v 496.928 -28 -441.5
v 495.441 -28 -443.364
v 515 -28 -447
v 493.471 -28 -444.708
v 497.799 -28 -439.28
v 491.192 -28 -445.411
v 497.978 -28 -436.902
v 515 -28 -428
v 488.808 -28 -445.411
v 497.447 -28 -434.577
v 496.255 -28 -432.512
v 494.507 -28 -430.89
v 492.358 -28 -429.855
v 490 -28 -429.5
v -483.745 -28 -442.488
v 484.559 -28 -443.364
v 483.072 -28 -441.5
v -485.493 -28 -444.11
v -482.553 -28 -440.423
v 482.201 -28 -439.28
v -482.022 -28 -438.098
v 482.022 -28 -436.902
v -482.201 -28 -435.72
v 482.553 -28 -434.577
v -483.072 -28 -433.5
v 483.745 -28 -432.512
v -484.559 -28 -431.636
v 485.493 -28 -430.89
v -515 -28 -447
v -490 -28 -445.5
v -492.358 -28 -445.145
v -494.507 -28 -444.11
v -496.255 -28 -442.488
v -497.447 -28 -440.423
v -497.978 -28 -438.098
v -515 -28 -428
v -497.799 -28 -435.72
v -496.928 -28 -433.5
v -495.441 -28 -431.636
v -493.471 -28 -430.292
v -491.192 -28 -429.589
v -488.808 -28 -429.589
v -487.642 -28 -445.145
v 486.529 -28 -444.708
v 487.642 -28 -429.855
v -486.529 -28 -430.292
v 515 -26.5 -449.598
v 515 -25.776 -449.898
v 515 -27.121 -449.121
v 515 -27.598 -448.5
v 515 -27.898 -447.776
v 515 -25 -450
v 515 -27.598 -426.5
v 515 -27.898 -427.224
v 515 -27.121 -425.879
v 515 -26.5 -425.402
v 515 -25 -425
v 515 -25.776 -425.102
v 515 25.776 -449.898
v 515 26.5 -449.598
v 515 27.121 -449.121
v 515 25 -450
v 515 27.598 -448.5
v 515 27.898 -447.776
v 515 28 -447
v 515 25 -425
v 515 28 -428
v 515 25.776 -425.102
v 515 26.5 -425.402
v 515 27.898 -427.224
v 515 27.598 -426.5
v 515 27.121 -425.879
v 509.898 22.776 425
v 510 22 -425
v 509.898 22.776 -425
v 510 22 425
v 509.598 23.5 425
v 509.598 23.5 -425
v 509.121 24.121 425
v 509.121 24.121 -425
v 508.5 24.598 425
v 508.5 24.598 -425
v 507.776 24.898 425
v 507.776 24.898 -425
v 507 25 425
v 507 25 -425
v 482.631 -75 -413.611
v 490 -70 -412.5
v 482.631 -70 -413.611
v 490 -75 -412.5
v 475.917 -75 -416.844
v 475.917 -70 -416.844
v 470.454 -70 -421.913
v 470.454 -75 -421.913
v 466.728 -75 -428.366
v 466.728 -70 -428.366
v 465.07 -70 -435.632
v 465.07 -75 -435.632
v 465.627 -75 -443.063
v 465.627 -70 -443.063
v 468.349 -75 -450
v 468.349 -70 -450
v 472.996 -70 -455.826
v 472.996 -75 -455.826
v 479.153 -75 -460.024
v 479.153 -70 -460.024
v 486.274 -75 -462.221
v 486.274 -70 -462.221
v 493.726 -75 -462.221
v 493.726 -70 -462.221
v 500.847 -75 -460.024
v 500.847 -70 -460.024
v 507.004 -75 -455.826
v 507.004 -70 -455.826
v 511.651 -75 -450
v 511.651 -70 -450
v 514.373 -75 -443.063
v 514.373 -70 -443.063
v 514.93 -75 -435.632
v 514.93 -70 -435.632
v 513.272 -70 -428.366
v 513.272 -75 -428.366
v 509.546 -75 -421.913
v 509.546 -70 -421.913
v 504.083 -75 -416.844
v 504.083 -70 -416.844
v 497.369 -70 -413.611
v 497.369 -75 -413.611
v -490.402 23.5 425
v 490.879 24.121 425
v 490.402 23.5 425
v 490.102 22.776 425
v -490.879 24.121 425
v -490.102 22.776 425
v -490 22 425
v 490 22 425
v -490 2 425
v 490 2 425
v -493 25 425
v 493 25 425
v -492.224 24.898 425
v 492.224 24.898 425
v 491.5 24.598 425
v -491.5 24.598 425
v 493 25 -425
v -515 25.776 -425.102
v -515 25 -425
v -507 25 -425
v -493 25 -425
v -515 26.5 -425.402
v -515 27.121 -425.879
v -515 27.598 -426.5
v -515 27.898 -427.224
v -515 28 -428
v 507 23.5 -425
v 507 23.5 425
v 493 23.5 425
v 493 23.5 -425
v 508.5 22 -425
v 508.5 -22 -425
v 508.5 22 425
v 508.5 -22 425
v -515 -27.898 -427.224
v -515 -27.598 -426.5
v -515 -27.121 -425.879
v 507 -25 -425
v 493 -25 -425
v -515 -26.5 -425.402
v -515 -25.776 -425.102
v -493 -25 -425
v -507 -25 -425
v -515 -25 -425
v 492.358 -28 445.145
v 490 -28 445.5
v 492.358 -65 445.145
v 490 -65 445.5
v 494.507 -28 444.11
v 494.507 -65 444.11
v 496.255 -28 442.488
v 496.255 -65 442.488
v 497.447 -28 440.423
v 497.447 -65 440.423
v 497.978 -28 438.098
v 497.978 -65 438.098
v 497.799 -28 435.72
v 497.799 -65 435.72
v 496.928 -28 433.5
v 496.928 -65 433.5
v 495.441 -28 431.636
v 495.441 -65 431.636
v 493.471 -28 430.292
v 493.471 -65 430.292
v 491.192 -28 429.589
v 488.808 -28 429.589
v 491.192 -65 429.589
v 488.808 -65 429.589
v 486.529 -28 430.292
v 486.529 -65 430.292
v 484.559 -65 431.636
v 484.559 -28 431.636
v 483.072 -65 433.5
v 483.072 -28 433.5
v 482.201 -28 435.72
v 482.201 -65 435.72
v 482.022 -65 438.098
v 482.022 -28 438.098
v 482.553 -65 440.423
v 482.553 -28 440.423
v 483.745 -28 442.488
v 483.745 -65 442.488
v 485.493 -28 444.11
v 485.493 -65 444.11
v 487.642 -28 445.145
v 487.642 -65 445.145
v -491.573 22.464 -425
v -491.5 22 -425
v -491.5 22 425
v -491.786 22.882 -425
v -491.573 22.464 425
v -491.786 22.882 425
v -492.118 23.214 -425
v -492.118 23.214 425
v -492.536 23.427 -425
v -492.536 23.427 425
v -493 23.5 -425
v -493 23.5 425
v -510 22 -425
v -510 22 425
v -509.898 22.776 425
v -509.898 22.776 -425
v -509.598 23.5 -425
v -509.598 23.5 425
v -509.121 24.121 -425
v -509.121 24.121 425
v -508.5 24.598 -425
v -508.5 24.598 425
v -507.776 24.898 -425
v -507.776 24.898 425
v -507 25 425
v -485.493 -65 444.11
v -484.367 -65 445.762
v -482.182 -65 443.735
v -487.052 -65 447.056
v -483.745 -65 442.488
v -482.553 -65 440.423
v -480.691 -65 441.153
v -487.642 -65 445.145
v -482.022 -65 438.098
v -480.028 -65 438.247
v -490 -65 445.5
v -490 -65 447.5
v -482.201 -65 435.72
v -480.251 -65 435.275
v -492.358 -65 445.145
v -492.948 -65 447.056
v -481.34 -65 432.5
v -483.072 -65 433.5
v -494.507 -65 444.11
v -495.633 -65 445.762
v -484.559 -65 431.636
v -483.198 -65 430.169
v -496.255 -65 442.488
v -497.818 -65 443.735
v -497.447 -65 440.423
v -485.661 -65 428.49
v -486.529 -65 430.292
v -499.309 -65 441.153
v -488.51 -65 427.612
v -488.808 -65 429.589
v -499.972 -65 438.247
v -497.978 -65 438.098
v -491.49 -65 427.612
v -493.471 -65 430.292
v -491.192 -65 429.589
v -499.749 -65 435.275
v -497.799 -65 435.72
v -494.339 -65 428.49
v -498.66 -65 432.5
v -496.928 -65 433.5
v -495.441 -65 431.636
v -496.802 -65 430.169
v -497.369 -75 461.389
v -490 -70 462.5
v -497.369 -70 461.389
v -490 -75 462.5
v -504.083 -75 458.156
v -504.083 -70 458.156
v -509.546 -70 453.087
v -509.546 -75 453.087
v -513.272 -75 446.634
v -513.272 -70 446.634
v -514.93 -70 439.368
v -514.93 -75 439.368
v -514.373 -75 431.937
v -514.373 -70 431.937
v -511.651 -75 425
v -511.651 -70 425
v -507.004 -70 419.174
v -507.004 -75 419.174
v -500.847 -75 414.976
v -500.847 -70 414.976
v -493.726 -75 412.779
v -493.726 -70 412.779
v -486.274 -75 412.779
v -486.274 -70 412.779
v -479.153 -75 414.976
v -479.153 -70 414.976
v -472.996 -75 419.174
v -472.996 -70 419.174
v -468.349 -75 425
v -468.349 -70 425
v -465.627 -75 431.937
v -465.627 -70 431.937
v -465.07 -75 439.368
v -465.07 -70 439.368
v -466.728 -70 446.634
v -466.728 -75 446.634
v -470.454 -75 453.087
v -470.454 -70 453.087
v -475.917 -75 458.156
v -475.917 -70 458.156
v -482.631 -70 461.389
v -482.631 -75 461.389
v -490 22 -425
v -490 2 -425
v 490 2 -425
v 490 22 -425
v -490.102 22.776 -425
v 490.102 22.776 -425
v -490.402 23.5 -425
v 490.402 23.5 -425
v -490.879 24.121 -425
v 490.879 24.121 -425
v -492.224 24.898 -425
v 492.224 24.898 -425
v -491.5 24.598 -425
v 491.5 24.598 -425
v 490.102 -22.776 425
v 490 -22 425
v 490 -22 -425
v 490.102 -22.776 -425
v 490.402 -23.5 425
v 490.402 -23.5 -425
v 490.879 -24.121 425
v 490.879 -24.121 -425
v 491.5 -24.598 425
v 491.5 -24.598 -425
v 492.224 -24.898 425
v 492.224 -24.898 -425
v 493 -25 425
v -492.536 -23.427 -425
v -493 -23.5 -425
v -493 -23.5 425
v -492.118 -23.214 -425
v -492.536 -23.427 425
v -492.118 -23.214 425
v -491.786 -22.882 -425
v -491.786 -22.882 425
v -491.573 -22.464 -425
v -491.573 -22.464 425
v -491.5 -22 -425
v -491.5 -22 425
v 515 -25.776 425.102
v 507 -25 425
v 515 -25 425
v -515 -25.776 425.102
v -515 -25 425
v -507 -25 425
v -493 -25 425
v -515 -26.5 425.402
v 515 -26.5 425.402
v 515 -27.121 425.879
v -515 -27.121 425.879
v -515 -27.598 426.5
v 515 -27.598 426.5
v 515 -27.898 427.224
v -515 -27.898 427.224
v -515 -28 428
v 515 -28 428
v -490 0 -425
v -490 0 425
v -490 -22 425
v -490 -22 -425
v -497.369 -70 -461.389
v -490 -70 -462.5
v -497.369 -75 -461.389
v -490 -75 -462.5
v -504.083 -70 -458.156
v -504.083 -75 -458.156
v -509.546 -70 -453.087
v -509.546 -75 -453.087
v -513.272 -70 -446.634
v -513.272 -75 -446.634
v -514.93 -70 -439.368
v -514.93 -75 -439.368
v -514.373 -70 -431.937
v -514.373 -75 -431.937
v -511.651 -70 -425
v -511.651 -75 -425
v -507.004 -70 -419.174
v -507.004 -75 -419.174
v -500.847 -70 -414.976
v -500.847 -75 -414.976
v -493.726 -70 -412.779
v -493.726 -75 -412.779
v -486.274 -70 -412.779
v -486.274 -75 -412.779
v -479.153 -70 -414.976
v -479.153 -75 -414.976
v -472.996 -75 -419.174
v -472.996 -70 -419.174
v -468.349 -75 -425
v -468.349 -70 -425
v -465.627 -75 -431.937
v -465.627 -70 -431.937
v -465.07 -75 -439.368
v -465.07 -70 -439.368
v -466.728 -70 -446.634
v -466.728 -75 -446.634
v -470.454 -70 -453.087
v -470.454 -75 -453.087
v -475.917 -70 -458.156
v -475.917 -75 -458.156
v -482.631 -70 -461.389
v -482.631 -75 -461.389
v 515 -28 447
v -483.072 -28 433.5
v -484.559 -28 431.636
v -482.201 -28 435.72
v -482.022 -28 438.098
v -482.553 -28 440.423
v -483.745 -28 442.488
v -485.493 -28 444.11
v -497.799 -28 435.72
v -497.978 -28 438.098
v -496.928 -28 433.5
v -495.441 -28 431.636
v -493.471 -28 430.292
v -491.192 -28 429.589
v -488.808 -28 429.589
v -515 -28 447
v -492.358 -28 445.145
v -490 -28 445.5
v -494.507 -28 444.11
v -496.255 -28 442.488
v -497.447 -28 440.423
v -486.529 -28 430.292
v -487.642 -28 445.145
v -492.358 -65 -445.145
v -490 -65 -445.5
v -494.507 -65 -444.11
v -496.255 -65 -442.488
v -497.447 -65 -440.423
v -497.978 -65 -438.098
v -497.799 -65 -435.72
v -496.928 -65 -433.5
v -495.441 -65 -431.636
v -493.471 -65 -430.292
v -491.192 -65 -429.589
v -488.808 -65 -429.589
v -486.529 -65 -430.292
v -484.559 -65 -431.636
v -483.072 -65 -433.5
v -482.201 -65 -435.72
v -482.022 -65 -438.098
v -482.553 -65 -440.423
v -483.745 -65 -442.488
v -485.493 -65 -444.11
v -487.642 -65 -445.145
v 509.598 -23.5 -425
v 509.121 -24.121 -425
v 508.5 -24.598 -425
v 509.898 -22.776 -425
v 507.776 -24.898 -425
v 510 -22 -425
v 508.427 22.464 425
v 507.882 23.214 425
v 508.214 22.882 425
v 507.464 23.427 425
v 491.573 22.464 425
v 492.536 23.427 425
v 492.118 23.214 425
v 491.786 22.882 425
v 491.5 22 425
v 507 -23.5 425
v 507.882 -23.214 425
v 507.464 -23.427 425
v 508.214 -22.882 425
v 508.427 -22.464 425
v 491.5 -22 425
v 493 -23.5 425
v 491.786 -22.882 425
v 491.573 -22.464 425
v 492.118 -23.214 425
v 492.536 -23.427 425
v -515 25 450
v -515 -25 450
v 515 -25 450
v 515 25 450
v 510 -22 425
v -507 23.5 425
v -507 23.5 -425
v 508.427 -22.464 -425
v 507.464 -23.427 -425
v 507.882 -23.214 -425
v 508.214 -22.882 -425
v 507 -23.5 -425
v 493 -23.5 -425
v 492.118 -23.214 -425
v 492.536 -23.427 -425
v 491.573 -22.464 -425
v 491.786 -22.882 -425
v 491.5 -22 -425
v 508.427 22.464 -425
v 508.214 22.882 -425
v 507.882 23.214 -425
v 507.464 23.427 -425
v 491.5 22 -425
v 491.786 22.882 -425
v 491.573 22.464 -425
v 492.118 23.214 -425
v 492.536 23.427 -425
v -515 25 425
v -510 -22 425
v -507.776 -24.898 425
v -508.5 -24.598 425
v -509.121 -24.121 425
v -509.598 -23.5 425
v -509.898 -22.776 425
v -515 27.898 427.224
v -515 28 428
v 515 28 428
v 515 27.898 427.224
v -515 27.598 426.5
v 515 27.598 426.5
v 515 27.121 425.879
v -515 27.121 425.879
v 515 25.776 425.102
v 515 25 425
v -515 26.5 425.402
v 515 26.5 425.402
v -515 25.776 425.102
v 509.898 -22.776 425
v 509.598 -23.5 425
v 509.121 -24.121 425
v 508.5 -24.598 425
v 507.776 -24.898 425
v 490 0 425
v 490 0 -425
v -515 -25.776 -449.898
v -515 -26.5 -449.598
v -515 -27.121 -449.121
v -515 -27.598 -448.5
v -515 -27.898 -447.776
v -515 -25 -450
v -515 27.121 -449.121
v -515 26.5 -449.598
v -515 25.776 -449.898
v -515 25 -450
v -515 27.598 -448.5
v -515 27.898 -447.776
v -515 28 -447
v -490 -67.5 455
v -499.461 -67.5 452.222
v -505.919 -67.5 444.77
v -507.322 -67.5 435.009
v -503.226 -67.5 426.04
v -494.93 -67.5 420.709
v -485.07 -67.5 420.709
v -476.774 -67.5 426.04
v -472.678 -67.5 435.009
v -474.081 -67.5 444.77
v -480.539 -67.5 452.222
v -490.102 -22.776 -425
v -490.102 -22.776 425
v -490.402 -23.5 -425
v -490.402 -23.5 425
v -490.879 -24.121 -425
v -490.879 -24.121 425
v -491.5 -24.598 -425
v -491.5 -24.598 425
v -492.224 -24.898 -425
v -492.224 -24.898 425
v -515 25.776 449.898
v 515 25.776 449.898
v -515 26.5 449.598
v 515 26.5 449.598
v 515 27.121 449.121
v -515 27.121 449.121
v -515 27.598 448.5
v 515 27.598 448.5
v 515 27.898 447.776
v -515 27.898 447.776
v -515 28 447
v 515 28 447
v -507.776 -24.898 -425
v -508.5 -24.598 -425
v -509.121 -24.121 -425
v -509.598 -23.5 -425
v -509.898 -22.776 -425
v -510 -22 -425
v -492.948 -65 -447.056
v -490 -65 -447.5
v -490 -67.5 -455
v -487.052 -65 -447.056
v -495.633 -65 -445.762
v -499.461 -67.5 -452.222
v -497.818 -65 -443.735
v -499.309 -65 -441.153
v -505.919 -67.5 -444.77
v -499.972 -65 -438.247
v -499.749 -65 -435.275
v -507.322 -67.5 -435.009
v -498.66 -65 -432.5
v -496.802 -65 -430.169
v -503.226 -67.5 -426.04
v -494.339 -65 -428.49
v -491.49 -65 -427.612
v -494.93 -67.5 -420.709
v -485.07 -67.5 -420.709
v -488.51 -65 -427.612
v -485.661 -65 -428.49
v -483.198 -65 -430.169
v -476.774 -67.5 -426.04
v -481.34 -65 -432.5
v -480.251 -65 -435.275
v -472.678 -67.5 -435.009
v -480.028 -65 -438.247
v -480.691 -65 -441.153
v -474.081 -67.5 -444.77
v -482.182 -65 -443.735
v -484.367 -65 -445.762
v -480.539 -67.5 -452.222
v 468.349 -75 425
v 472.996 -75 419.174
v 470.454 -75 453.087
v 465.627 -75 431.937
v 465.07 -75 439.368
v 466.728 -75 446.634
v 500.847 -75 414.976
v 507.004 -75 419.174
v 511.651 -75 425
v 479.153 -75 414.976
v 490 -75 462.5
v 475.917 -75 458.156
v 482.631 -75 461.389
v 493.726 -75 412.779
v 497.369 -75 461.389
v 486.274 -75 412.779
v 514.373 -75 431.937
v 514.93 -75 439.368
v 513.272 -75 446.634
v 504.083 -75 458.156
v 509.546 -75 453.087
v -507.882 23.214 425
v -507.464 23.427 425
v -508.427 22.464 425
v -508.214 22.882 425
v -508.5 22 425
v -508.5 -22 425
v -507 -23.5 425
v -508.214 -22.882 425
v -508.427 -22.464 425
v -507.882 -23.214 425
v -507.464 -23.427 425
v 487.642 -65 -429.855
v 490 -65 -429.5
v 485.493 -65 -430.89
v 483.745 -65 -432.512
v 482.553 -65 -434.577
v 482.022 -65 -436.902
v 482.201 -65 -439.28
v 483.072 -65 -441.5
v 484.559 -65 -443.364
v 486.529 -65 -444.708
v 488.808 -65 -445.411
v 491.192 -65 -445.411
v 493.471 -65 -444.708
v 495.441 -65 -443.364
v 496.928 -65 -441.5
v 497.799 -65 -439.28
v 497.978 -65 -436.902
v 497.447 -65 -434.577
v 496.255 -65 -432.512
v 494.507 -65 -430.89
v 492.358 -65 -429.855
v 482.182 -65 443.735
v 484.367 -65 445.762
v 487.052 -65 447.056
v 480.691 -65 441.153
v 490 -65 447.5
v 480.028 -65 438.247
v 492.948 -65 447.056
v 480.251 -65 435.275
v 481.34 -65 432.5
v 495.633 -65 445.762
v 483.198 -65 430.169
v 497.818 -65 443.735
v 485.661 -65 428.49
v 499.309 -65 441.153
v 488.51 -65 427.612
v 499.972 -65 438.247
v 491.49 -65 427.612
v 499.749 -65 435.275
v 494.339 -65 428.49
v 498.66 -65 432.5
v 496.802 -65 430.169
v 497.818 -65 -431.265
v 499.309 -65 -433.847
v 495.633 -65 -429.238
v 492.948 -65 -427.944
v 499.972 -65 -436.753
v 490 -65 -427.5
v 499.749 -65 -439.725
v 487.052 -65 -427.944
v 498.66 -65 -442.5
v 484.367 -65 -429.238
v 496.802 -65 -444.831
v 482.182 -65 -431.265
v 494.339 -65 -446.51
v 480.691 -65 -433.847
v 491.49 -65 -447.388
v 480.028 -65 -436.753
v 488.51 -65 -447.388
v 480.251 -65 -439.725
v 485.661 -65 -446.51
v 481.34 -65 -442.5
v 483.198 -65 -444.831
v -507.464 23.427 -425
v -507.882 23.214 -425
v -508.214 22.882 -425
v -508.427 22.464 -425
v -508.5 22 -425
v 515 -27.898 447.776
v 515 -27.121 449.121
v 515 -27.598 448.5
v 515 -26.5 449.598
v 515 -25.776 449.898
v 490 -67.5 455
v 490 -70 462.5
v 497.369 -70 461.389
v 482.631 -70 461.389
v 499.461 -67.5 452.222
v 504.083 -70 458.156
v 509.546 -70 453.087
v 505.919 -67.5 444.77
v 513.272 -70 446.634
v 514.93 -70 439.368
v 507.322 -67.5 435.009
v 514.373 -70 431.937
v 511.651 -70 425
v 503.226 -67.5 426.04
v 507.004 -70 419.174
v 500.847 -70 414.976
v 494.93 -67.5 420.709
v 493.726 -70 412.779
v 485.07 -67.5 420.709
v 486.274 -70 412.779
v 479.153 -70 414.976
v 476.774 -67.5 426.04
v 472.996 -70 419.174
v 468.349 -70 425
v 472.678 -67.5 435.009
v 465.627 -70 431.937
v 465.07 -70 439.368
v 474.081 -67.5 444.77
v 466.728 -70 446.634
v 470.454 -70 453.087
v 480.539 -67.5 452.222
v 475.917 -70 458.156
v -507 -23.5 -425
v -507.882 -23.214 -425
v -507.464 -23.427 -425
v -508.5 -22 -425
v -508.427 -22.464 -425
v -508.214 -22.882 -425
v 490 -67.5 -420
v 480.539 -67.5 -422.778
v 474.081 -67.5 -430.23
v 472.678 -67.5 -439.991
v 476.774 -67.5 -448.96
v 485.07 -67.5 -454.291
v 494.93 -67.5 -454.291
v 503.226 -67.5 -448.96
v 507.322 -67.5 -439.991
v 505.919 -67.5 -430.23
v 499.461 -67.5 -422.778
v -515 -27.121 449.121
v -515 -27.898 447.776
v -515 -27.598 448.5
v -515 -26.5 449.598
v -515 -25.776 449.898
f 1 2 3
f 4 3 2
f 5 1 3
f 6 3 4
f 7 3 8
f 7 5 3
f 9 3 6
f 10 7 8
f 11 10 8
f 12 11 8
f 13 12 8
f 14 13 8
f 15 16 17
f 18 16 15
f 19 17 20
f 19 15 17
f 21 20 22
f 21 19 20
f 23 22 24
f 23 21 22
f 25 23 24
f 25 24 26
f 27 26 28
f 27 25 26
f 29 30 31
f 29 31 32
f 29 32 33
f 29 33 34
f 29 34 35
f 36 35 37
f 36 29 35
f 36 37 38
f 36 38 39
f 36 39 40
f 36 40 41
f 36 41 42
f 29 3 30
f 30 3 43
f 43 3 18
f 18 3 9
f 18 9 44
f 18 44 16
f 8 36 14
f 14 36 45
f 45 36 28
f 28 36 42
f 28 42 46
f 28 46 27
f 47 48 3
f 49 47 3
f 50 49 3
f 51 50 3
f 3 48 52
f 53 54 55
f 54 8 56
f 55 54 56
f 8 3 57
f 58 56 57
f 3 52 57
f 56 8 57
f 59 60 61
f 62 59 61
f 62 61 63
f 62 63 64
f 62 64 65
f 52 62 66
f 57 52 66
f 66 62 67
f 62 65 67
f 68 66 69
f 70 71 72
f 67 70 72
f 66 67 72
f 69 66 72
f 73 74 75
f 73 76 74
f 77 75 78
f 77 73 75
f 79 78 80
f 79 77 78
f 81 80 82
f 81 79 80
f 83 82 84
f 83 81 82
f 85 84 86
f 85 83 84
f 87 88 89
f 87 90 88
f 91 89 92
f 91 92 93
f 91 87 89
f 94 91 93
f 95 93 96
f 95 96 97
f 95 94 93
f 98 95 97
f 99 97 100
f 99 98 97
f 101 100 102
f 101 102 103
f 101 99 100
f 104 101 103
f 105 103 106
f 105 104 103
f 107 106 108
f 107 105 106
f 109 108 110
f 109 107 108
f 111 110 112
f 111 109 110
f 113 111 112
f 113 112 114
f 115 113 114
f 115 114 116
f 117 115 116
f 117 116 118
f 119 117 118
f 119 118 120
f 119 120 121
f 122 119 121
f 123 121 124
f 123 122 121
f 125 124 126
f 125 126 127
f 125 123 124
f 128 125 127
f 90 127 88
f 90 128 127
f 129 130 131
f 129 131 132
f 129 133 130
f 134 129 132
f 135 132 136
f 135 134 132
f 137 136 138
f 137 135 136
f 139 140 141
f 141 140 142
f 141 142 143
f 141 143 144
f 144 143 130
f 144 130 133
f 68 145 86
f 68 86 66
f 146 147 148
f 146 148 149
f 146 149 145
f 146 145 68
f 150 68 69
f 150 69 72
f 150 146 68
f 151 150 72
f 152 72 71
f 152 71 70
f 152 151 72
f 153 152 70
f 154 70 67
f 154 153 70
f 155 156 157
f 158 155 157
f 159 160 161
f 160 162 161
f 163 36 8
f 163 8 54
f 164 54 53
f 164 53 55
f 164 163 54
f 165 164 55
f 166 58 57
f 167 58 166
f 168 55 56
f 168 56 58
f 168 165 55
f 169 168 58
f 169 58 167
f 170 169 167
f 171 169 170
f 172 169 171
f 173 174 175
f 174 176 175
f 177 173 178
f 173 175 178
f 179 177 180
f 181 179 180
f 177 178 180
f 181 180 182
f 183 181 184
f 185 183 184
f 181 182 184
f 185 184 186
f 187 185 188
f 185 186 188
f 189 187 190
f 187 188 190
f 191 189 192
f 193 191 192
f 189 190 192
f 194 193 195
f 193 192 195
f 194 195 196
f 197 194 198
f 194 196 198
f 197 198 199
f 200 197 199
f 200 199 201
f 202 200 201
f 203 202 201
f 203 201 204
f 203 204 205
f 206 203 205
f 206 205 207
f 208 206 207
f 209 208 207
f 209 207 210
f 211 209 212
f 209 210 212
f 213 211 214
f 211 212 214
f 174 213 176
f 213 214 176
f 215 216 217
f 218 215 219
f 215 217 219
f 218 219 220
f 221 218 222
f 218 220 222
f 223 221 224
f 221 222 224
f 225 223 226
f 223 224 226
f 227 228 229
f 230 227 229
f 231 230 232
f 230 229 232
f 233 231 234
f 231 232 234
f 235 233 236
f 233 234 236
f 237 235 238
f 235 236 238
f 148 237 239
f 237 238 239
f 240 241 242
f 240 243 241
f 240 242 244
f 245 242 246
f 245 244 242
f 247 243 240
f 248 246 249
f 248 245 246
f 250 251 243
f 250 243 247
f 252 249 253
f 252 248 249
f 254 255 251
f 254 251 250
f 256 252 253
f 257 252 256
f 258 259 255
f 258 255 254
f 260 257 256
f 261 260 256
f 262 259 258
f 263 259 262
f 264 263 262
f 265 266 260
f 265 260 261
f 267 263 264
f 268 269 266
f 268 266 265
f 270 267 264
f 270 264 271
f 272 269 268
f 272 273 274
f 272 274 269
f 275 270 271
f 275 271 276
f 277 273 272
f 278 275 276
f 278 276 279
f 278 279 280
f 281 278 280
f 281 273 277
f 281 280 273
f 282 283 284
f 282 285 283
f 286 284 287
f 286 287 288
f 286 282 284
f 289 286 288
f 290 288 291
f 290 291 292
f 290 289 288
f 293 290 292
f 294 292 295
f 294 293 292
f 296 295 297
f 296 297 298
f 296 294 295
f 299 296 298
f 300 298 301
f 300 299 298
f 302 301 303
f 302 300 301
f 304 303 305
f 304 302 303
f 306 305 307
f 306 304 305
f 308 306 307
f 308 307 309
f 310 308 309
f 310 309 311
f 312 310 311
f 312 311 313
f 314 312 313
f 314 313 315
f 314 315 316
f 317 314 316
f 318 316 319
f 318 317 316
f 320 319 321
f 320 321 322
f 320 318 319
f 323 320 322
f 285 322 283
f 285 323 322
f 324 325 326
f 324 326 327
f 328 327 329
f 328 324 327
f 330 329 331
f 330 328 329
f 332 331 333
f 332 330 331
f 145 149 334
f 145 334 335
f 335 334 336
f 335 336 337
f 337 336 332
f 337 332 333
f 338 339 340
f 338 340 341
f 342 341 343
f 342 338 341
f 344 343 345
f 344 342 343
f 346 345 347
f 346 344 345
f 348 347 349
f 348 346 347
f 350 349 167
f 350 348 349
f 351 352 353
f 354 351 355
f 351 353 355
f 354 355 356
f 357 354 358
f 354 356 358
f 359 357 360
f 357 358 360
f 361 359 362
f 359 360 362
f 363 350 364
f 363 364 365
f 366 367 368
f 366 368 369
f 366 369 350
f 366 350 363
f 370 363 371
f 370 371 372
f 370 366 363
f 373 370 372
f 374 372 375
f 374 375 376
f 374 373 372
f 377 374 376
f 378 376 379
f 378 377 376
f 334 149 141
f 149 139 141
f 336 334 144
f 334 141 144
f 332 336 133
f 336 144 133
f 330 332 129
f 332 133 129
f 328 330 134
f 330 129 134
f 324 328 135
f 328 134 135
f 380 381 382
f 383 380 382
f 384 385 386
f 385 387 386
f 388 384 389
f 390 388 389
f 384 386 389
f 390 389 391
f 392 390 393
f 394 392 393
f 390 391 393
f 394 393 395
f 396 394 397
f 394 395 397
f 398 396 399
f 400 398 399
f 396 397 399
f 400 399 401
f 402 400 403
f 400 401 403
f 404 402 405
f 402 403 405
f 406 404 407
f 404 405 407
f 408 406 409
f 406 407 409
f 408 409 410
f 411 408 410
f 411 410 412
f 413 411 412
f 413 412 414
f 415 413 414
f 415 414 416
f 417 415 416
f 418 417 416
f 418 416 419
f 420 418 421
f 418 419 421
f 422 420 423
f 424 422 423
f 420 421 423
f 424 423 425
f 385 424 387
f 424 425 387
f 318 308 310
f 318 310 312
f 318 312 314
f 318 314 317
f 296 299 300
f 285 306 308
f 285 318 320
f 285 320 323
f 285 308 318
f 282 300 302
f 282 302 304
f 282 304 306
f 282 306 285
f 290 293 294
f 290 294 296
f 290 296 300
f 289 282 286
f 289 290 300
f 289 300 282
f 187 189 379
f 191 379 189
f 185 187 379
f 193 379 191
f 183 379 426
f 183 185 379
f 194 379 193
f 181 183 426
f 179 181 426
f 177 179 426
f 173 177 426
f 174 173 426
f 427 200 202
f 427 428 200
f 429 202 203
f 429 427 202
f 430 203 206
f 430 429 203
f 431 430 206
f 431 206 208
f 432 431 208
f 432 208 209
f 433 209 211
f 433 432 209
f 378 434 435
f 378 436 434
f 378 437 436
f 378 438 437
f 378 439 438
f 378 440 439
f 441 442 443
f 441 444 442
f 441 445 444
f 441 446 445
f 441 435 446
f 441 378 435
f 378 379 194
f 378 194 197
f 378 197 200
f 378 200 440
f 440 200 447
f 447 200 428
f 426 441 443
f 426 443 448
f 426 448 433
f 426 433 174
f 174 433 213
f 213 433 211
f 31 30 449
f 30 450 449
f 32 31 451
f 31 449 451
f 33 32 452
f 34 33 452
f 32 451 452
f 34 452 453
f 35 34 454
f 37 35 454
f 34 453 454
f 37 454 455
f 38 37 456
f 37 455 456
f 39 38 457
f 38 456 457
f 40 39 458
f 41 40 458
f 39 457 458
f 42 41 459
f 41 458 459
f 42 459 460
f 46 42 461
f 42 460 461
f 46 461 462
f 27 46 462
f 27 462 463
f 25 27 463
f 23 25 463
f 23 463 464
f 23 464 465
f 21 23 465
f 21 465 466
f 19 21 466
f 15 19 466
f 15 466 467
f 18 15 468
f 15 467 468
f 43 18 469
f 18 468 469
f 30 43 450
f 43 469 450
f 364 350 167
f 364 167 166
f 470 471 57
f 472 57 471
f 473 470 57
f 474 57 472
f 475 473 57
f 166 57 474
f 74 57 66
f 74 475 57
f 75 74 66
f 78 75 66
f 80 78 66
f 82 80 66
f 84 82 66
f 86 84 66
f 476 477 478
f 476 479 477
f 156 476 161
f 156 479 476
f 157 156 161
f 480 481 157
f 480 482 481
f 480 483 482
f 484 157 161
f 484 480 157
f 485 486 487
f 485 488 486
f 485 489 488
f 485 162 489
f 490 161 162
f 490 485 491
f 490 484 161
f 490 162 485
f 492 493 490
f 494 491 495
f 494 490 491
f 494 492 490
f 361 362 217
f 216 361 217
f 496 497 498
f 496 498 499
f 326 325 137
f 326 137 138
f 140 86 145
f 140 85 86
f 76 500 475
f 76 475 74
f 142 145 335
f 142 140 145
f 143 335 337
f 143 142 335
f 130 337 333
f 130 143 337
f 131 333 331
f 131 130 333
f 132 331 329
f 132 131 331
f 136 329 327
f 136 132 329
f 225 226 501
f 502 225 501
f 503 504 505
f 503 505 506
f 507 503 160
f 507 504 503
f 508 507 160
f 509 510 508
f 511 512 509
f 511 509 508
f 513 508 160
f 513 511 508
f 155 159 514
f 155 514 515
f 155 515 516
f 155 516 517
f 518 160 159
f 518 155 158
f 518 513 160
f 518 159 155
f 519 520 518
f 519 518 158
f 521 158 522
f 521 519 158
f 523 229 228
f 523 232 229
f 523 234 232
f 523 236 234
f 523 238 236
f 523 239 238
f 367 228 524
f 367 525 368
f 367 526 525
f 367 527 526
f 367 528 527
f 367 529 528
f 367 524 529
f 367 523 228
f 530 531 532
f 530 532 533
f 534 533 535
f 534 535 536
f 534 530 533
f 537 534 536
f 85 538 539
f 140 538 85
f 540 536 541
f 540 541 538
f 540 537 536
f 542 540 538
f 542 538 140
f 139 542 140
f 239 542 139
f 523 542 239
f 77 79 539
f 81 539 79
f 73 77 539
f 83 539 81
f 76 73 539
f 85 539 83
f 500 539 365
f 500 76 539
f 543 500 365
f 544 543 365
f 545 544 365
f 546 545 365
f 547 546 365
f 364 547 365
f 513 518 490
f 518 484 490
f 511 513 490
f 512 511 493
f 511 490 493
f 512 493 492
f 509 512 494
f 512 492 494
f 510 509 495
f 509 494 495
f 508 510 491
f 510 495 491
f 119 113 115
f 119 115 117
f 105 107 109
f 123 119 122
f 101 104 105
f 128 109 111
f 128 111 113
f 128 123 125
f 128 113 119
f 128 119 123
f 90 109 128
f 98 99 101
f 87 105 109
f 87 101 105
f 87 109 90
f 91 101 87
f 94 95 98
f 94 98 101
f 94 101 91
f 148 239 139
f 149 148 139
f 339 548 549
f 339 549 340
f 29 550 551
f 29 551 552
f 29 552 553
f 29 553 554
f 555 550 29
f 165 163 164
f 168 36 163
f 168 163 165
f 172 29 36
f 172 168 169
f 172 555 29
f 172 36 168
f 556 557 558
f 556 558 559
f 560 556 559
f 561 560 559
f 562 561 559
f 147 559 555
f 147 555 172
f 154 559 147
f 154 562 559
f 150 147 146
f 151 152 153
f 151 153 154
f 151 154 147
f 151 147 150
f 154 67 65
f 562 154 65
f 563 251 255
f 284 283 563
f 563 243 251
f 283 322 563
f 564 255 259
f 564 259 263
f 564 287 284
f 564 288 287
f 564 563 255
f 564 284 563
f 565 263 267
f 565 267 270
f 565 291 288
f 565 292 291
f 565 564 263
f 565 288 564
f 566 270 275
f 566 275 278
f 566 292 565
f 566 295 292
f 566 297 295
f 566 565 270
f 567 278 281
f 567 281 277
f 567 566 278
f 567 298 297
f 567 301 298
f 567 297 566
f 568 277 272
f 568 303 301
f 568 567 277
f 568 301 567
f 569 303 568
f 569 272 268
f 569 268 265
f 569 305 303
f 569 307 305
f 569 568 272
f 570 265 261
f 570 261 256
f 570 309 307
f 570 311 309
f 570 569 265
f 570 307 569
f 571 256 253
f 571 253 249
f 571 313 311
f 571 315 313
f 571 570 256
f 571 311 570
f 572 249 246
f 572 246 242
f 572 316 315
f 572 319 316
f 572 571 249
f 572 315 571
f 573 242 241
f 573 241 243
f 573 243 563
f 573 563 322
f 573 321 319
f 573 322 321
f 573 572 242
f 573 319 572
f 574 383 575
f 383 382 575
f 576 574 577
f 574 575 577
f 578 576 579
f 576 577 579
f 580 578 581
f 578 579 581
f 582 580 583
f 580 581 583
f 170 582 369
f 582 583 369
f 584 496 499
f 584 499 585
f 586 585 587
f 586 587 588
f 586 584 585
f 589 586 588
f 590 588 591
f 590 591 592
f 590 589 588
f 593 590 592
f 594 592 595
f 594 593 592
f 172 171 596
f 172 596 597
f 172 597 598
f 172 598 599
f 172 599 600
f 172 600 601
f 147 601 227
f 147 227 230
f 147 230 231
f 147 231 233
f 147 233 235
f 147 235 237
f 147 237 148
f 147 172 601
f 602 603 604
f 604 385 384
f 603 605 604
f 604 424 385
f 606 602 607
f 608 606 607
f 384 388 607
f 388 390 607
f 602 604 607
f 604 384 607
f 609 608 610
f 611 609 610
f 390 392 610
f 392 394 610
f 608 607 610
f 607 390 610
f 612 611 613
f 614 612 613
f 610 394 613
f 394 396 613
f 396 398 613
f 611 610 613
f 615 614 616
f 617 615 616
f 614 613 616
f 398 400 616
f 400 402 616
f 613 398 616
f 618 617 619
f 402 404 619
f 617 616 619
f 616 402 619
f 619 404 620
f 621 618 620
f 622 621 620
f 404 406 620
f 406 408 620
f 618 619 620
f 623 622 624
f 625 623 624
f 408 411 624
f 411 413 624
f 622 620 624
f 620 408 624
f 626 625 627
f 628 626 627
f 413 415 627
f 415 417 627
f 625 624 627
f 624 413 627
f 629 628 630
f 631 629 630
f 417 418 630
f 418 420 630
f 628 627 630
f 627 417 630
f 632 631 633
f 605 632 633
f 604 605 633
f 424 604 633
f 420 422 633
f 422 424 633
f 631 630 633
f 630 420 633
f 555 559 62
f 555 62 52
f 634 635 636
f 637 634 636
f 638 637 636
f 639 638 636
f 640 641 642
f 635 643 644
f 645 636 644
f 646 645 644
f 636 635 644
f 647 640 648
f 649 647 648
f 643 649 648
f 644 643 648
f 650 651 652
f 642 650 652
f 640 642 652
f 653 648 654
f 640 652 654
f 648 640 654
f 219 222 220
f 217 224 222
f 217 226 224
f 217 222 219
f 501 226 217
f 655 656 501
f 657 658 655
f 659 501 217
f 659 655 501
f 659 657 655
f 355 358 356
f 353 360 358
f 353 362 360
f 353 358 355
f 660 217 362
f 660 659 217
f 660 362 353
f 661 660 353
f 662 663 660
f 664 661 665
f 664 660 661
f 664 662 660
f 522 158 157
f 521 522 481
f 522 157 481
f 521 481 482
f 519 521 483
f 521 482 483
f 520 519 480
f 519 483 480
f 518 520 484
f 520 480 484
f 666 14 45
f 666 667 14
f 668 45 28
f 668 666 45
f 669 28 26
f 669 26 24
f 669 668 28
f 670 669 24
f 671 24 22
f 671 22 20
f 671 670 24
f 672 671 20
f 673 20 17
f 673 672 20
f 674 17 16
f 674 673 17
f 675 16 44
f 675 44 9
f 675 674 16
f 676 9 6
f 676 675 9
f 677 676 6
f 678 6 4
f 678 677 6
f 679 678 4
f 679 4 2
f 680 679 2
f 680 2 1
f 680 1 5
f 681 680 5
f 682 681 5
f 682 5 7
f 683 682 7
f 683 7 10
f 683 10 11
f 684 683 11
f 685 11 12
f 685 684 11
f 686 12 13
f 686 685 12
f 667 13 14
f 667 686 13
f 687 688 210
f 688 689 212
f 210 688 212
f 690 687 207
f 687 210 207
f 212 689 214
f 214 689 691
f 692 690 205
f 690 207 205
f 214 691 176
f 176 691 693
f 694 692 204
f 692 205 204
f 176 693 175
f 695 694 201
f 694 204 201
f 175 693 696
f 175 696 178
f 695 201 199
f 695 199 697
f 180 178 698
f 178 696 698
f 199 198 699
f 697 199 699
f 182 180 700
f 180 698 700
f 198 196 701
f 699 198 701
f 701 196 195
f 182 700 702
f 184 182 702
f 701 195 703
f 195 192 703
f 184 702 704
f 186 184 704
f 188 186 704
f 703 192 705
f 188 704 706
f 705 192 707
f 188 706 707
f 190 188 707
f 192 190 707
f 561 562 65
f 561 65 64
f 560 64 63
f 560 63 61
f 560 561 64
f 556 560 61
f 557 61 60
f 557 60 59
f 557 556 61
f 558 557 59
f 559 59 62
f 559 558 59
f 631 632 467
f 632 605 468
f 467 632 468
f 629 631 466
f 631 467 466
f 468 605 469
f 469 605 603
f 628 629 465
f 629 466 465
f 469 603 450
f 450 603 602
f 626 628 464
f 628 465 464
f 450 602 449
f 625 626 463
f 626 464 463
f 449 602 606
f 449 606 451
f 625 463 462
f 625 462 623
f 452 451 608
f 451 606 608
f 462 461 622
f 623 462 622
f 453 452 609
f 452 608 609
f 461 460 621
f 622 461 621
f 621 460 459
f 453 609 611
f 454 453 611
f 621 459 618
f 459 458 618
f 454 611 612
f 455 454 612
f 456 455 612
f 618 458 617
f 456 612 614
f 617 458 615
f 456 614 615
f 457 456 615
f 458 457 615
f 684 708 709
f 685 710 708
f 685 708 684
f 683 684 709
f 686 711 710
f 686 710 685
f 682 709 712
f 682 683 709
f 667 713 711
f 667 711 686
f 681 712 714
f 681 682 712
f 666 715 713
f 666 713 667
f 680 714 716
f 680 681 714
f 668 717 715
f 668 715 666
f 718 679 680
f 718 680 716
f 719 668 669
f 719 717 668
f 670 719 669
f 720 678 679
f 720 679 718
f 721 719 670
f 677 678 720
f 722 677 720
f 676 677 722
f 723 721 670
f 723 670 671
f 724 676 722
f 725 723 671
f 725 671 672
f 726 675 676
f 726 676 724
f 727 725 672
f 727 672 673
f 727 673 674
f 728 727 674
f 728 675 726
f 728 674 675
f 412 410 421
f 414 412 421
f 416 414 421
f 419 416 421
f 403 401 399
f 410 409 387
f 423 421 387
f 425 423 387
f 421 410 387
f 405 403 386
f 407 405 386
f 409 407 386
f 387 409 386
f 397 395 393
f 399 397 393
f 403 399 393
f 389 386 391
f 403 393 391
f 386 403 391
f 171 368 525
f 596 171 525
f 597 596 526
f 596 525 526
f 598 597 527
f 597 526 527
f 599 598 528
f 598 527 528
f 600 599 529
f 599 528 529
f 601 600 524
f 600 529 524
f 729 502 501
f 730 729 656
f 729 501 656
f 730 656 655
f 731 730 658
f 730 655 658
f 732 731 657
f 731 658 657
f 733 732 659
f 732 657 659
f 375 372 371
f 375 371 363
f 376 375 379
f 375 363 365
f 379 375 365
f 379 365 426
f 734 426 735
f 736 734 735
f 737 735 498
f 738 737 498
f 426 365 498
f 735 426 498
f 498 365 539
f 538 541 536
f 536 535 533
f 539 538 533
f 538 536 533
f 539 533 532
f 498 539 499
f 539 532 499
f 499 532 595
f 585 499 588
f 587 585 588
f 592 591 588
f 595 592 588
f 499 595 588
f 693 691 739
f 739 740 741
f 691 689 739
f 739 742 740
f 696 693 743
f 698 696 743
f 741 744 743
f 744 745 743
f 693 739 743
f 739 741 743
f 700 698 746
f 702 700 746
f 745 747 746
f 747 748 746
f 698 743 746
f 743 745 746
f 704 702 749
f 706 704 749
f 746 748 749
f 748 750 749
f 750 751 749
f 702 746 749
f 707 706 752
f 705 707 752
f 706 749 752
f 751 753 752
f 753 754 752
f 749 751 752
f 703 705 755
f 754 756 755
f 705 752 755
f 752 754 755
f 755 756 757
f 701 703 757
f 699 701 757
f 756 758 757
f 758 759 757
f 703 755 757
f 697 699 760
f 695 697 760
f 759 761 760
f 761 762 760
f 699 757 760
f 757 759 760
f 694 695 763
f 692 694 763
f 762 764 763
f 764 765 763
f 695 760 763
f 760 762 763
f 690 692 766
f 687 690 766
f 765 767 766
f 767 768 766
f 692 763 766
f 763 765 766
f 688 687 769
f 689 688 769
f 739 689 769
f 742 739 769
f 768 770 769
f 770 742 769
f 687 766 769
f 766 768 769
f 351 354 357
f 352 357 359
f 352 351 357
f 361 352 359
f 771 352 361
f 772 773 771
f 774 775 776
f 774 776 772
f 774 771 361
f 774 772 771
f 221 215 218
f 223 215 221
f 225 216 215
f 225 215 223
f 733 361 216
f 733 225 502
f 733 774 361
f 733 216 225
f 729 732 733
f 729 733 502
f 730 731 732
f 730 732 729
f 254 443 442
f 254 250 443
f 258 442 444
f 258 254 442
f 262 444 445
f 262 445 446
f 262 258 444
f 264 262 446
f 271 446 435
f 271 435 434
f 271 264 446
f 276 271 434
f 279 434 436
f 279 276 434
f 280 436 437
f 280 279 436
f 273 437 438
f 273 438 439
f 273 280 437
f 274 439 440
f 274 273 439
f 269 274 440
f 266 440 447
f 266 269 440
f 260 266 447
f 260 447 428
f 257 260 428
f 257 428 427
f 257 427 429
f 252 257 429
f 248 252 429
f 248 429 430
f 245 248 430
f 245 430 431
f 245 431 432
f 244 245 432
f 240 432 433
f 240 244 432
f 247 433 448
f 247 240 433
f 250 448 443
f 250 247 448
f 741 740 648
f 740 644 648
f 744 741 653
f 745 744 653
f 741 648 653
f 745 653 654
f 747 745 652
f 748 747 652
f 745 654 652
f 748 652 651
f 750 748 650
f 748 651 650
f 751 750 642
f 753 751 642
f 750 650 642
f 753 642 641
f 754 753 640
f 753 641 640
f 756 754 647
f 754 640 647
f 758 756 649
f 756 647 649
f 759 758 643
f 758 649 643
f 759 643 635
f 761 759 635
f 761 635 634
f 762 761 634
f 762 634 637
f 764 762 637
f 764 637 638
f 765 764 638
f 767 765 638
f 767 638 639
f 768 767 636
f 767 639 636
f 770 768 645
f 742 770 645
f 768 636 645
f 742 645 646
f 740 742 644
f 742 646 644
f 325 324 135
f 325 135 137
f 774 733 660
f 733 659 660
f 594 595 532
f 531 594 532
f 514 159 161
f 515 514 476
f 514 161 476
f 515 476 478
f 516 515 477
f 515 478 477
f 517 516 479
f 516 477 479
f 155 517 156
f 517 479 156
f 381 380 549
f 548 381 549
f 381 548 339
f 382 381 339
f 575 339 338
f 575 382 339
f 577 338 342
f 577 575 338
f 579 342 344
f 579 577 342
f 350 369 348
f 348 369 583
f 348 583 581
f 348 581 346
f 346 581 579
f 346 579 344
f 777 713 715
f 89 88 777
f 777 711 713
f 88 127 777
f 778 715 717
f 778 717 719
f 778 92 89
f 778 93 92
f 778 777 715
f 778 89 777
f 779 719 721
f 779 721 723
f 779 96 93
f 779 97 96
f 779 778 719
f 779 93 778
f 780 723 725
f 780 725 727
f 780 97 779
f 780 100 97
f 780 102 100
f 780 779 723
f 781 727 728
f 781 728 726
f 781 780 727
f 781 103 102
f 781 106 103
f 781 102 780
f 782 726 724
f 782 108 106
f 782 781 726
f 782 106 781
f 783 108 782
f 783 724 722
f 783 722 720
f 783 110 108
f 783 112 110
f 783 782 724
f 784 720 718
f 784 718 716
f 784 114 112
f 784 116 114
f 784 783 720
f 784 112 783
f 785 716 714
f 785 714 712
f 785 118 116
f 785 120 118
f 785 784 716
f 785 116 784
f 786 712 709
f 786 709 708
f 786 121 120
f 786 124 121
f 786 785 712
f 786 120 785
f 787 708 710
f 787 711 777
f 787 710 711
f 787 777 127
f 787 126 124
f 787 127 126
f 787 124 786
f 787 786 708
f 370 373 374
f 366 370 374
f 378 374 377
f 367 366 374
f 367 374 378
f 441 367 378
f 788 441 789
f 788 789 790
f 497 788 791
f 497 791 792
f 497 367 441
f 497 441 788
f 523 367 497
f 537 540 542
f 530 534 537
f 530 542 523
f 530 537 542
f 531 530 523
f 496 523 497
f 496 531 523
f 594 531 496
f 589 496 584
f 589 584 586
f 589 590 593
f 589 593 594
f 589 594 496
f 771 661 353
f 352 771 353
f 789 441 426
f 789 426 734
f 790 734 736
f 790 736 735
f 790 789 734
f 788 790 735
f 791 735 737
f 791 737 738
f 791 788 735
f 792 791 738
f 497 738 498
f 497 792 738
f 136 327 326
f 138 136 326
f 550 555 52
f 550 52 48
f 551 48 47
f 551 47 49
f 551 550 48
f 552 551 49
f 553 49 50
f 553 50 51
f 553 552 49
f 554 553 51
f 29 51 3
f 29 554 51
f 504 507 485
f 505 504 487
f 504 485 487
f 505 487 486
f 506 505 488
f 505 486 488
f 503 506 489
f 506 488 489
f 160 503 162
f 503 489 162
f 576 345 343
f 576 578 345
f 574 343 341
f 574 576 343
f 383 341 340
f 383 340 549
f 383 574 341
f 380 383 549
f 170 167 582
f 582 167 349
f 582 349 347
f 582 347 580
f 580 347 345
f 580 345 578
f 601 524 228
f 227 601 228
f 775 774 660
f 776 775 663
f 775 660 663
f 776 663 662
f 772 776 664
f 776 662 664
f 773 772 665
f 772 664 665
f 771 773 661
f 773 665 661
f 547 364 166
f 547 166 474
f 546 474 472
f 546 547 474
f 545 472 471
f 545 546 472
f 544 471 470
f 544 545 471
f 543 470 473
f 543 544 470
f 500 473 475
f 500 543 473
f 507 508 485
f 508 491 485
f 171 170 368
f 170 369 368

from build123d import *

# Parameters (mm, degrees)
EXTRUDE_1_DEPTH      = 425
EXTRUDE_1_2_DEPTH    = 425
EXTRUDE_4_DEPTH      = 515
EXTRUDE_4_DEPTH_BACK = 515
SKETCH_3_W           = 980
SKETCH_3_H           = 850
EXTRUDE_5_DEPTH      = 2


with BuildPart() as part:
    # Эскиз1 → Бобышка-Вытянуть1 (new, symmetric)
    with BuildSketch(Plane.XY):
        with BuildLine():
            Line((-507, 25), (-493, 25))
            ThreePointArc((-493, 25), (-490.878679656, 24.121320344), (-490, 22))
            Line((-490, 22), (-490, -22))
            ThreePointArc((-490, -22), (-490.878679656, -24.121320344), (-493, -25))
            Line((-493, -25), (-507, -25))
            ThreePointArc((-507, -25), (-509.121320344, -24.121320344), (-510, -22))
            Line((-510, -22), (-510, 22))
            ThreePointArc((-510, 22), (-509.121320344, 24.121320344), (-507, 25))
        make_face()
        with BuildLine():
            Line((-508.5, 22), (-508.5, -22))
            ThreePointArc((-508.5, -22), (-508.060660172, -23.060660172), (-507, -23.5))
            Line((-507, -23.5), (-493, -23.5))
            ThreePointArc((-493, -23.5), (-491.939339828, -23.060660172), (-491.5, -22))
            Line((-491.5, -22), (-491.5, 22))
            ThreePointArc((-491.5, 22), (-491.939339828, 23.060660172), (-493, 23.5))
            Line((-493, 23.5), (-507, 23.5))
            ThreePointArc((-507, 23.5), (-508.060660172, 23.060660172), (-508.5, 22))
        make_face(mode=Mode.SUBTRACT)
    extrude(amount=EXTRUDE_1_DEPTH, both=True)



with BuildPart() as body_2:
    # Эскиз1 → Extrude 1 2 (new, symmetric)
    with BuildSketch(Plane.XY):
        with BuildLine():
            Line((490, 22), (490, -22))
            ThreePointArc((490, -22), (490.878679656, -24.121320344), (493, -25))
            Line((493, -25), (507, -25))
            ThreePointArc((507, -25), (509.121320344, -24.121320344), (510, -22))
            Line((510, -22), (510, 22))
            ThreePointArc((510, 22), (509.121320344, 24.121320344), (507, 25))
            Line((507, 25), (493, 25))
            ThreePointArc((493, 25), (490.878679656, 24.121320344), (490, 22))
        make_face()
        with BuildLine():
            Line((507, 23.5), (493, 23.5))
            ThreePointArc((493, 23.5), (491.939339828, 23.060660172), (491.5, 22))
            Line((491.5, 22), (491.5, -22))
            ThreePointArc((491.5, -22), (491.939339828, -23.060660172), (493, -23.5))
            Line((493, -23.5), (507, -23.5))
            ThreePointArc((507, -23.5), (508.060660172, -23.060660172), (508.5, -22))
            Line((508.5, -22), (508.5, 22))
            ThreePointArc((508.5, 22), (508.060660172, 23.060660172), (507, 23.5))
        make_face(mode=Mode.SUBTRACT)
    extrude(amount=EXTRUDE_1_2_DEPTH, both=True)

    # Эскиз2 → Бобышка-Вытянуть4 (add, two sides: drawn at the far end of the back side and taken through both)
    with BuildSketch(Plane(origin=(0, 0, 0), x_dir=(0, 0, -1), z_dir=(1, 0, 0)).offset(-EXTRUDE_4_DEPTH_BACK)):
        with BuildLine():
            Line((425, -25), (425, 25))
            ThreePointArc((425, 25), (425.878679656, 27.121320344), (428, 28))
            Line((428, 28), (447, 28))
            ThreePointArc((447, 28), (449.121320344, 27.121320344), (450, 25))
            Line((450, 25), (450, -25))
            ThreePointArc((450, -25), (449.121320344, -27.121320344), (447, -28))
            Line((447, -28), (428, -28))
            ThreePointArc((428, -28), (425.878679656, -27.121320344), (425, -25))
        make_face()
        with BuildLine():
            Line((-428, -28), (-447, -28))
            ThreePointArc((-447, -28), (-449.121320344, -27.121320344), (-450, -25))
            Line((-450, -25), (-450, 25))
            ThreePointArc((-450, 25), (-449.121320344, 27.121320344), (-447, 28))
            Line((-447, 28), (-428, 28))
            ThreePointArc((-428, 28), (-425.878679656, 27.121320344), (-425, 25))
            Line((-425, 25), (-425, -25))
            ThreePointArc((-425, -25), (-425.878679656, -27.121320344), (-428, -28))
        make_face()
    extrude(amount=EXTRUDE_4_DEPTH + EXTRUDE_4_DEPTH_BACK)


with BuildPart() as part_1:
    add(part.part)

    add(body_2.part)  # Бобышка-Вытянуть5 merges body 2
    # Эскиз3 → Бобышка-Вытянуть5 (add)
    with BuildSketch(Plane(origin=(0, 0, 0), x_dir=(1, 0, 0), z_dir=(0, 1, 0))):
        Rectangle(SKETCH_3_W, SKETCH_3_H)
    extrude(amount=EXTRUDE_5_DEPTH)

    # Эскиз4 → Повернуть1 (revolve)
    with BuildSketch(Plane(origin=(-490, 0, 0), x_dir=(0, 0, -1), z_dir=(1, 0, 0)), mode=Mode.PRIVATE) as revolve_1_sk:
        Polygon((-437.5, -28), (-429.5, -28), (-429.5, -65), (-427.5, -65), (-412.5, -70), (-412.5, -75), (-437.5, -75), align=None)
    revolve_1 = revolve(revolve_1_sk.sketch.rotate(Axis((-490, 28, 437.5), (0, -1, 0)), 180), axis=Axis((-490, 28, 437.5), (0, -1, 0)))

    # Зеркальное отражение1: Повернуть1 across plane
    add(revolve_1.mirror(Plane(origin=(0, 0, 0), x_dir=(0, 0, 1), z_dir=(1, 0, 0))))

    # Зеркальное отражение2: Повернуть1 across plane
    add(revolve_1.mirror(Plane.XY))

    # Зеркальное отражение2 copy 1 sketch → Зеркальное отражение2 copy 1 (revolve)
    with BuildSketch(Plane.ZY.offset(-490)):
        Polygon((-437.5, -28), (-429.5, -28), (-429.5, -65), (-427.5, -65), (-412.5, -70), (-412.5, -75), (-437.5, -75), align=None)
    revolve(axis=Axis((490, 28, -437.5), (0, -1, 0)))


solid = part_1.part
